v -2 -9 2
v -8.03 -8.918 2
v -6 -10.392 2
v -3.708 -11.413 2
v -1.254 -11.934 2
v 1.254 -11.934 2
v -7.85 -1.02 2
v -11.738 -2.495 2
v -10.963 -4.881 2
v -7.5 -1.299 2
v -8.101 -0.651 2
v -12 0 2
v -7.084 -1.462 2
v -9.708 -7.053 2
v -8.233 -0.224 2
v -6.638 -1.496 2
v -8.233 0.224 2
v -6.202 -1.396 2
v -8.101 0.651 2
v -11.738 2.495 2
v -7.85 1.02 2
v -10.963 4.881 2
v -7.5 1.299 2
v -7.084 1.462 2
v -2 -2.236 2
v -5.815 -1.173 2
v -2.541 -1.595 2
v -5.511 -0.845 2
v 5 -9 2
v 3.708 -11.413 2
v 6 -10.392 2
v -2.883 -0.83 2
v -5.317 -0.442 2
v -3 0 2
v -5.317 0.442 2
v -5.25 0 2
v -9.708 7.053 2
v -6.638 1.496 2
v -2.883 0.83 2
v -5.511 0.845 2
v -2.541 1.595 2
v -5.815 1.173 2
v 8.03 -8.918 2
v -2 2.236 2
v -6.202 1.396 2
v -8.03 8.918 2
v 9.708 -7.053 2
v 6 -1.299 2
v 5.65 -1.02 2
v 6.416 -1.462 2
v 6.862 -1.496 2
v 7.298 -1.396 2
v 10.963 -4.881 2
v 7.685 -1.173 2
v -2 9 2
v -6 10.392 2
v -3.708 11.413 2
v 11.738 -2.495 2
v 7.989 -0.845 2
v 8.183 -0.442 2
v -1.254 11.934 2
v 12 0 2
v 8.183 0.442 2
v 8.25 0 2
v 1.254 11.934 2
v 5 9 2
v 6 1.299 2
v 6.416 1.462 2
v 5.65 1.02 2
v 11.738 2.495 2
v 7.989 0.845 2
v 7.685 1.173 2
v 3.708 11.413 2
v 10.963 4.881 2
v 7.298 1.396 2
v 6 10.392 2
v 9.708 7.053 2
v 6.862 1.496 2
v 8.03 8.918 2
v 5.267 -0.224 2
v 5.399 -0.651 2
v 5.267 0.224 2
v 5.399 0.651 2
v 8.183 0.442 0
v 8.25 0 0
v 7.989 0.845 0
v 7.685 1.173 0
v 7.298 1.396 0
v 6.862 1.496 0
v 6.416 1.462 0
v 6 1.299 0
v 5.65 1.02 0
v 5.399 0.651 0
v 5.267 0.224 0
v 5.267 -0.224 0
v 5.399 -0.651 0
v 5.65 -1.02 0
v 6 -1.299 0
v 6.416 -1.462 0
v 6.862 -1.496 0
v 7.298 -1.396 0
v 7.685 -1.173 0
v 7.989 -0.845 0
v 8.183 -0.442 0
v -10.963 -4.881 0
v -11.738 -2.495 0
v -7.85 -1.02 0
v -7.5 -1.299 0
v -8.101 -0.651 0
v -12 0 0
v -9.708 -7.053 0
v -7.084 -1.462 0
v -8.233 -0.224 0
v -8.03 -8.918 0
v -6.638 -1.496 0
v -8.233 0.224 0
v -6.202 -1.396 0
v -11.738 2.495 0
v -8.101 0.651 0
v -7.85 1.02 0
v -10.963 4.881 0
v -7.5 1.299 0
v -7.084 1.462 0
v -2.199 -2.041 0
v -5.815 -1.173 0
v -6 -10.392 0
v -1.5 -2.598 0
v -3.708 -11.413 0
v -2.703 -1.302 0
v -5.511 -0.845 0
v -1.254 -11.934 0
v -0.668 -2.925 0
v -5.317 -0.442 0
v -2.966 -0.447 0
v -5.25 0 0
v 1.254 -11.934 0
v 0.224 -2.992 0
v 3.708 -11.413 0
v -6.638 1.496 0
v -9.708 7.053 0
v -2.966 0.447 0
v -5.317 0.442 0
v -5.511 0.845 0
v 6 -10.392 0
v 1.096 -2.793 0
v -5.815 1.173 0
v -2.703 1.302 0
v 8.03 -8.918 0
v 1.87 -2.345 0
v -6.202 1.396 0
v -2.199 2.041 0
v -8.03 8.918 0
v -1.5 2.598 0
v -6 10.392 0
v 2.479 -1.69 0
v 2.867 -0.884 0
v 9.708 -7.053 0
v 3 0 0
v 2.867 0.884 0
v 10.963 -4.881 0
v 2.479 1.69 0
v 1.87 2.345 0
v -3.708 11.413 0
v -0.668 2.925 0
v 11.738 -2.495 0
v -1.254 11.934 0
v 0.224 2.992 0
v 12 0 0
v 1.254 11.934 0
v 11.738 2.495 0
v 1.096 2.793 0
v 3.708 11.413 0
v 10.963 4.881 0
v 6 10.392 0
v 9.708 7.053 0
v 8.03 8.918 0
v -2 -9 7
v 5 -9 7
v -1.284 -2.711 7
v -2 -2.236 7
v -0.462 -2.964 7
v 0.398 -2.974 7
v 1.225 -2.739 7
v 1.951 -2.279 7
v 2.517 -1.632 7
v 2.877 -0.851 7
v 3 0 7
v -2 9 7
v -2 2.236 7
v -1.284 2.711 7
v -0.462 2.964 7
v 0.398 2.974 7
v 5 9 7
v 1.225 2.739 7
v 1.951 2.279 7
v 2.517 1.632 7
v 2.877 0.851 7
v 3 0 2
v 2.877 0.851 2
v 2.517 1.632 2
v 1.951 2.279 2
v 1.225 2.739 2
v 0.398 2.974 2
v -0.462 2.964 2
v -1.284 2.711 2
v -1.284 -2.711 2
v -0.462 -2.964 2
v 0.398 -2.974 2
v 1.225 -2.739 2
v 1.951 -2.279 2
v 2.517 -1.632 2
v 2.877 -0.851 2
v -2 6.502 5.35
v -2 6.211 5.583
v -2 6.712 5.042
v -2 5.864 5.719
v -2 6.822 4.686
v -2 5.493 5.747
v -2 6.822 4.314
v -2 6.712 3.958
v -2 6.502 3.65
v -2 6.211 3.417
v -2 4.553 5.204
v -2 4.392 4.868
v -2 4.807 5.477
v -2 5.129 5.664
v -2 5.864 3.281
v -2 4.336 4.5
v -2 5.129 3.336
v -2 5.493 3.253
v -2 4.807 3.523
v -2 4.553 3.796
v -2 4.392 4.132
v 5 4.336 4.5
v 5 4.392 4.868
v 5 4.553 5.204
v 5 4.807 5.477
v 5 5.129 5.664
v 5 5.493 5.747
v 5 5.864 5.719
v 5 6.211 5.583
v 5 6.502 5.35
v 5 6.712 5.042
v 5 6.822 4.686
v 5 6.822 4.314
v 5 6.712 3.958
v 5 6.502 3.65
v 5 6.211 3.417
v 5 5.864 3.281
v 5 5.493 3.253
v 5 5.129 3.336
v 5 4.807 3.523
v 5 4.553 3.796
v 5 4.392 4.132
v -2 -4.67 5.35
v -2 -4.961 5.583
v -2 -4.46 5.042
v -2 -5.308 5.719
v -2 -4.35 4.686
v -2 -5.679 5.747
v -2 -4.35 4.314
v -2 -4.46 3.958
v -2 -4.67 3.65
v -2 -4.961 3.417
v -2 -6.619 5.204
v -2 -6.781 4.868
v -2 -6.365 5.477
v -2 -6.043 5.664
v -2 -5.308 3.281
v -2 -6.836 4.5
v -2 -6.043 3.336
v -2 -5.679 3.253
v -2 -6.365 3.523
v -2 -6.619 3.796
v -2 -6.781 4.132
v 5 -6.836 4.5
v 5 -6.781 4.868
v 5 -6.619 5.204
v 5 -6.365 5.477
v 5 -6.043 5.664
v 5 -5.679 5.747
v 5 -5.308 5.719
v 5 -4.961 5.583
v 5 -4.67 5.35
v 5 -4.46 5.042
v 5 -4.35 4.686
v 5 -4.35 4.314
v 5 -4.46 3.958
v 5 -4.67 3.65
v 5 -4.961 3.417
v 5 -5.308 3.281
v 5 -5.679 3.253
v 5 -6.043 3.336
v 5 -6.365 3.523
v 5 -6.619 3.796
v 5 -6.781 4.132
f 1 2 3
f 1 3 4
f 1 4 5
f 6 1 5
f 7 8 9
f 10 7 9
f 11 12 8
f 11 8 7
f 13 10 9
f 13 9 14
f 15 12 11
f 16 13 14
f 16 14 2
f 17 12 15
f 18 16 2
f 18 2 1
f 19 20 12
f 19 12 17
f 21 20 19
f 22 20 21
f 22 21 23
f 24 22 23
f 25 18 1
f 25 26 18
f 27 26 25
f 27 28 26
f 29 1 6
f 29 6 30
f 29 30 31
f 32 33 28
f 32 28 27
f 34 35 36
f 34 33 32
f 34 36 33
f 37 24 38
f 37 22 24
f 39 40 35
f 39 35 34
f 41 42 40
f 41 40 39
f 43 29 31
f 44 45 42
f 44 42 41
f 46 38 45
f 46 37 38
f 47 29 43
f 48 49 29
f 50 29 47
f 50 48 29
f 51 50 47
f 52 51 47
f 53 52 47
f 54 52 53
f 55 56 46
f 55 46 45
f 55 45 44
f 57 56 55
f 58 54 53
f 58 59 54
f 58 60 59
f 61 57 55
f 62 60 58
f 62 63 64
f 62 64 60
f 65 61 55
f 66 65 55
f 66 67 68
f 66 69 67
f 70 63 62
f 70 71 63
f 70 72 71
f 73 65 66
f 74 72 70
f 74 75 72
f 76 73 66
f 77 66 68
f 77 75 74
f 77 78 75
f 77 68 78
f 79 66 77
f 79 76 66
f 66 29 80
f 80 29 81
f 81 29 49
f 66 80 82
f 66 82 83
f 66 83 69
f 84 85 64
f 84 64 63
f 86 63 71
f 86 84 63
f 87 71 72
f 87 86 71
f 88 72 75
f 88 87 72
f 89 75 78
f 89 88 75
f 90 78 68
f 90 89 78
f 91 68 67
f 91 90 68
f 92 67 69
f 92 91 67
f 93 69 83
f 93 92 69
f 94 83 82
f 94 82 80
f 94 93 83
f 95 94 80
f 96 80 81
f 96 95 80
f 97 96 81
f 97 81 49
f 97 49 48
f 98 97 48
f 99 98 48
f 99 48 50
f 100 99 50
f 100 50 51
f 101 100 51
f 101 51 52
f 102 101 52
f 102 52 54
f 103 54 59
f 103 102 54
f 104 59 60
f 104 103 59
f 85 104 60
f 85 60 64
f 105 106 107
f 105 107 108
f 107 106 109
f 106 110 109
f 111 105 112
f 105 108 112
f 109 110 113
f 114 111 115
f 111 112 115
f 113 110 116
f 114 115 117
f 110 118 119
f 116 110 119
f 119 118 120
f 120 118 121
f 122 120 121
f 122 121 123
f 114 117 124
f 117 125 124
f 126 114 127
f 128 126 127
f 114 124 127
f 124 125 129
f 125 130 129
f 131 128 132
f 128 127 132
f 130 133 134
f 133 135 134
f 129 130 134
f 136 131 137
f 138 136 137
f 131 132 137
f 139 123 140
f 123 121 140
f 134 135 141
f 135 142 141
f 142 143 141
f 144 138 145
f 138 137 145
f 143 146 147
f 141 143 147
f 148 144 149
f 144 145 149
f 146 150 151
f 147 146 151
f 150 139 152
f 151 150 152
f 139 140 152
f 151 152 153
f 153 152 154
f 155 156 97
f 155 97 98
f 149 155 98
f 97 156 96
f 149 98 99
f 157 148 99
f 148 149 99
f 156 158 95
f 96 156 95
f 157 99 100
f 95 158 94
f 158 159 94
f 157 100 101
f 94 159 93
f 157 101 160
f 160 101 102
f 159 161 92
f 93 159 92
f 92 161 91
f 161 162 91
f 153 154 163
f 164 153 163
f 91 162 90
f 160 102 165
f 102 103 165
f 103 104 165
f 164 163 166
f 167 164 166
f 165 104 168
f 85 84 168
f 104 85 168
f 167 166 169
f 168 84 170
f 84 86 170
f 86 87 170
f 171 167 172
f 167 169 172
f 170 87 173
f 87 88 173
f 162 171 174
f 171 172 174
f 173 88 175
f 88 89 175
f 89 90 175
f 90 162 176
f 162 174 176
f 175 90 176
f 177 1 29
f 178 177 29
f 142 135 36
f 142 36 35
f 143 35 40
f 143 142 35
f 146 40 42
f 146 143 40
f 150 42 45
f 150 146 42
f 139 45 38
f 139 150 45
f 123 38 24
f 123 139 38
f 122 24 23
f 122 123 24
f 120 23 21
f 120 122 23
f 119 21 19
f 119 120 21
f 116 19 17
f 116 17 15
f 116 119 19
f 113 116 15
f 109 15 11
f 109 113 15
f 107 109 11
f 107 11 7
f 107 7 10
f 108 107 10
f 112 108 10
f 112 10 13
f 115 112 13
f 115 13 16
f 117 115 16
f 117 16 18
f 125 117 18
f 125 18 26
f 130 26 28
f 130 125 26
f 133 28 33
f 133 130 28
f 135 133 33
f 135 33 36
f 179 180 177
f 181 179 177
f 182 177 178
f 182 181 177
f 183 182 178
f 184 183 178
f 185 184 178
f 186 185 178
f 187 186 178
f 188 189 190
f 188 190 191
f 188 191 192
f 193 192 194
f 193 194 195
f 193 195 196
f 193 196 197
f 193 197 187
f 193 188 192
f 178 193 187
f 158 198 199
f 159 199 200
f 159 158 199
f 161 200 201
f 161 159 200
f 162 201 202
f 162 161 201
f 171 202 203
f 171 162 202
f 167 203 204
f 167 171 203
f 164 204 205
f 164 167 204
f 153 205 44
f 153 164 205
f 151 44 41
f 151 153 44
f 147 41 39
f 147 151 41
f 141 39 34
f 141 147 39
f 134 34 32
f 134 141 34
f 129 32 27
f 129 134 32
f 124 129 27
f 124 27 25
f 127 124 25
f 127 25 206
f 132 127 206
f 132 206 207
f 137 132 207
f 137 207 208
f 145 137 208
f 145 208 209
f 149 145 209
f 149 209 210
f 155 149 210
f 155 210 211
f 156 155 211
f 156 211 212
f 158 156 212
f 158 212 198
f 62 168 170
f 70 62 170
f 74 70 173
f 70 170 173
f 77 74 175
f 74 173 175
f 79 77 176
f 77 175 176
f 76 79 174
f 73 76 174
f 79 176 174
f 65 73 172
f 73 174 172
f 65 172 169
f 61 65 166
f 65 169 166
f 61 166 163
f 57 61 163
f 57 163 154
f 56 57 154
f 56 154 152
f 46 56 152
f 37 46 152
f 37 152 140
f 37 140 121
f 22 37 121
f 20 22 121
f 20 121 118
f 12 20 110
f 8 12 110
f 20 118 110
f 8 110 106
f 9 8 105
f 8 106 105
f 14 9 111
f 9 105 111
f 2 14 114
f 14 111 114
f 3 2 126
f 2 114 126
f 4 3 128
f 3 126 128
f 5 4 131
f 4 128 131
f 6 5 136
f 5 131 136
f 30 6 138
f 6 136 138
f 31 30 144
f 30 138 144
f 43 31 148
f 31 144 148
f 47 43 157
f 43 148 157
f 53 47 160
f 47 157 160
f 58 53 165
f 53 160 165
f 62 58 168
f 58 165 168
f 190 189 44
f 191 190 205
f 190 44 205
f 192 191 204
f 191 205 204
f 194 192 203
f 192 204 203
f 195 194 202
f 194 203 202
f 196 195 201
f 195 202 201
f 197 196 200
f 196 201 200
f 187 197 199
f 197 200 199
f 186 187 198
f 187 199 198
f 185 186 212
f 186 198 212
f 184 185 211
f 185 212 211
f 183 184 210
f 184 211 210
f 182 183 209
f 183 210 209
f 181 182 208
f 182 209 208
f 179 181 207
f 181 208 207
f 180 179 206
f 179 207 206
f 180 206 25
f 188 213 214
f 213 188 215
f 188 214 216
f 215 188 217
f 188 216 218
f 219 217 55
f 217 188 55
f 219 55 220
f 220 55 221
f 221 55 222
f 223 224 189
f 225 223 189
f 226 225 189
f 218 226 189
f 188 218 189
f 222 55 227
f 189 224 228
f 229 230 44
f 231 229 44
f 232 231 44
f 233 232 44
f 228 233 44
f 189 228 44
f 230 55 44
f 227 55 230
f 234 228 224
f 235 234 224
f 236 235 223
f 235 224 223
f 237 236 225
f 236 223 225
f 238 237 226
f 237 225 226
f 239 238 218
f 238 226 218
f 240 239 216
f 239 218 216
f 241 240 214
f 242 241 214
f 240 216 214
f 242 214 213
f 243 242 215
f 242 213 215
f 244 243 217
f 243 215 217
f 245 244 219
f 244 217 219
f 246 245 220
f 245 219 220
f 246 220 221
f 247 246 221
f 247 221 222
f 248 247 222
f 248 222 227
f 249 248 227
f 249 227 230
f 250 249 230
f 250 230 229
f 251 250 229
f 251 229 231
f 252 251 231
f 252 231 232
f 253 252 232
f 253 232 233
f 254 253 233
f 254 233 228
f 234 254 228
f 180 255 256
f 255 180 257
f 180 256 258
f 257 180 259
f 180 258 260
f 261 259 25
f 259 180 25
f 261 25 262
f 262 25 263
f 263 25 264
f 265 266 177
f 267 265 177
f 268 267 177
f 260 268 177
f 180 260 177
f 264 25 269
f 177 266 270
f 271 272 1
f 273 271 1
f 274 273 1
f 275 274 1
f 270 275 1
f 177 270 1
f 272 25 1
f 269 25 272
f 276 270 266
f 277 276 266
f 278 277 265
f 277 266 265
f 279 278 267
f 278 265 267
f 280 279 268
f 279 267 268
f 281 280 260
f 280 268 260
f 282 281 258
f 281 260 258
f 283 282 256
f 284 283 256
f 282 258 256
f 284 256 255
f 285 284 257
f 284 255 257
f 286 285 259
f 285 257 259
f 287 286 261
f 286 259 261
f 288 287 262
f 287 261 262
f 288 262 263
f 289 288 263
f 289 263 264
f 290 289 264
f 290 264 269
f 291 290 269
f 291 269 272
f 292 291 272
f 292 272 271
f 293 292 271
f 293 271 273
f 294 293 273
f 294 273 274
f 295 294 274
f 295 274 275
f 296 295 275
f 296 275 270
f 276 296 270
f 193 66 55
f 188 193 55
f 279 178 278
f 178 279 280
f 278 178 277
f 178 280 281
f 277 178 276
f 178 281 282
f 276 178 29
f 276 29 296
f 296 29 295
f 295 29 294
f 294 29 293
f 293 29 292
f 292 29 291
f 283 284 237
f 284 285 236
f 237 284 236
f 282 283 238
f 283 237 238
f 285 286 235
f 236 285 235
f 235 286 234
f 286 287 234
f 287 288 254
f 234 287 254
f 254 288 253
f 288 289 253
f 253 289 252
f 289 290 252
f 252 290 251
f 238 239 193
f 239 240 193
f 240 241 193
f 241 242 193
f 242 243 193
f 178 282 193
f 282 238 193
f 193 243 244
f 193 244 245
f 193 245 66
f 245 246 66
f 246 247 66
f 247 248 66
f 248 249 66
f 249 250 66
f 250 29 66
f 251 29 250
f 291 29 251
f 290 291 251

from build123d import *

# Parameters (mm, degrees)
ESQUISSE1_R             = 12
ESQUISSE1_R_2           = 1.5
ESQUISSE1_R_3           = 3
BOSS_EXTRU_1_DEPTH      = 2
BOSS_EXTRU_2_DEPTH      = 5
ESQUISSE3_R             = 1.25
ENL_V_MAT_EXTRU_1_DEPTH = 20.723082923


with BuildPart() as part:
    # Esquisse1 → Boss.-Extru.1 (new body)
    with BuildSketch(Plane.XY):
        Circle(ESQUISSE1_R)
        with Locations((-6.75, 0)):
            Circle(ESQUISSE1_R_2, mode=Mode.SUBTRACT)
        with Locations((6.75, 0)):
            Circle(ESQUISSE1_R_2, mode=Mode.SUBTRACT)
        Circle(ESQUISSE1_R_3, mode=Mode.SUBTRACT)
    extrude(amount=BOSS_EXTRU_1_DEPTH)

    # Esquisse2 → Boss.-Extru.2 (add)
    with BuildSketch(Plane.XY.offset(2)):
        with BuildLine():
            Line((-2, -2.236067977), (-2, -9))
            Line((-2, -9), (5, -9))
            Line((5, -9), (5, 9))
            Line((5, 9), (-2, 9))
            Line((-2, 9), (-2, 2.236067977))
            ThreePointArc((-2, 2.236067977), (3, 0), (-2, -2.236067977))
        make_face()
    extrude(amount=BOSS_EXTRU_2_DEPTH)

    # Esquisse3 → Enlèv. mat.-Extru.1 (cut, through all)
    with BuildSketch(Plane.ZY.offset(2)):
        with Locations(Location((4.5, 5.586067977, 0), (0, 0, 270))):
            Circle(ESQUISSE3_R)
        with Locations(Location((4.5, -5.586067977, 0), (0, 0, 270))):
            Circle(ESQUISSE3_R)
    extrude(amount=-ENL_V_MAT_EXTRU_1_DEPTH, mode=Mode.SUBTRACT)


solid = part.part
